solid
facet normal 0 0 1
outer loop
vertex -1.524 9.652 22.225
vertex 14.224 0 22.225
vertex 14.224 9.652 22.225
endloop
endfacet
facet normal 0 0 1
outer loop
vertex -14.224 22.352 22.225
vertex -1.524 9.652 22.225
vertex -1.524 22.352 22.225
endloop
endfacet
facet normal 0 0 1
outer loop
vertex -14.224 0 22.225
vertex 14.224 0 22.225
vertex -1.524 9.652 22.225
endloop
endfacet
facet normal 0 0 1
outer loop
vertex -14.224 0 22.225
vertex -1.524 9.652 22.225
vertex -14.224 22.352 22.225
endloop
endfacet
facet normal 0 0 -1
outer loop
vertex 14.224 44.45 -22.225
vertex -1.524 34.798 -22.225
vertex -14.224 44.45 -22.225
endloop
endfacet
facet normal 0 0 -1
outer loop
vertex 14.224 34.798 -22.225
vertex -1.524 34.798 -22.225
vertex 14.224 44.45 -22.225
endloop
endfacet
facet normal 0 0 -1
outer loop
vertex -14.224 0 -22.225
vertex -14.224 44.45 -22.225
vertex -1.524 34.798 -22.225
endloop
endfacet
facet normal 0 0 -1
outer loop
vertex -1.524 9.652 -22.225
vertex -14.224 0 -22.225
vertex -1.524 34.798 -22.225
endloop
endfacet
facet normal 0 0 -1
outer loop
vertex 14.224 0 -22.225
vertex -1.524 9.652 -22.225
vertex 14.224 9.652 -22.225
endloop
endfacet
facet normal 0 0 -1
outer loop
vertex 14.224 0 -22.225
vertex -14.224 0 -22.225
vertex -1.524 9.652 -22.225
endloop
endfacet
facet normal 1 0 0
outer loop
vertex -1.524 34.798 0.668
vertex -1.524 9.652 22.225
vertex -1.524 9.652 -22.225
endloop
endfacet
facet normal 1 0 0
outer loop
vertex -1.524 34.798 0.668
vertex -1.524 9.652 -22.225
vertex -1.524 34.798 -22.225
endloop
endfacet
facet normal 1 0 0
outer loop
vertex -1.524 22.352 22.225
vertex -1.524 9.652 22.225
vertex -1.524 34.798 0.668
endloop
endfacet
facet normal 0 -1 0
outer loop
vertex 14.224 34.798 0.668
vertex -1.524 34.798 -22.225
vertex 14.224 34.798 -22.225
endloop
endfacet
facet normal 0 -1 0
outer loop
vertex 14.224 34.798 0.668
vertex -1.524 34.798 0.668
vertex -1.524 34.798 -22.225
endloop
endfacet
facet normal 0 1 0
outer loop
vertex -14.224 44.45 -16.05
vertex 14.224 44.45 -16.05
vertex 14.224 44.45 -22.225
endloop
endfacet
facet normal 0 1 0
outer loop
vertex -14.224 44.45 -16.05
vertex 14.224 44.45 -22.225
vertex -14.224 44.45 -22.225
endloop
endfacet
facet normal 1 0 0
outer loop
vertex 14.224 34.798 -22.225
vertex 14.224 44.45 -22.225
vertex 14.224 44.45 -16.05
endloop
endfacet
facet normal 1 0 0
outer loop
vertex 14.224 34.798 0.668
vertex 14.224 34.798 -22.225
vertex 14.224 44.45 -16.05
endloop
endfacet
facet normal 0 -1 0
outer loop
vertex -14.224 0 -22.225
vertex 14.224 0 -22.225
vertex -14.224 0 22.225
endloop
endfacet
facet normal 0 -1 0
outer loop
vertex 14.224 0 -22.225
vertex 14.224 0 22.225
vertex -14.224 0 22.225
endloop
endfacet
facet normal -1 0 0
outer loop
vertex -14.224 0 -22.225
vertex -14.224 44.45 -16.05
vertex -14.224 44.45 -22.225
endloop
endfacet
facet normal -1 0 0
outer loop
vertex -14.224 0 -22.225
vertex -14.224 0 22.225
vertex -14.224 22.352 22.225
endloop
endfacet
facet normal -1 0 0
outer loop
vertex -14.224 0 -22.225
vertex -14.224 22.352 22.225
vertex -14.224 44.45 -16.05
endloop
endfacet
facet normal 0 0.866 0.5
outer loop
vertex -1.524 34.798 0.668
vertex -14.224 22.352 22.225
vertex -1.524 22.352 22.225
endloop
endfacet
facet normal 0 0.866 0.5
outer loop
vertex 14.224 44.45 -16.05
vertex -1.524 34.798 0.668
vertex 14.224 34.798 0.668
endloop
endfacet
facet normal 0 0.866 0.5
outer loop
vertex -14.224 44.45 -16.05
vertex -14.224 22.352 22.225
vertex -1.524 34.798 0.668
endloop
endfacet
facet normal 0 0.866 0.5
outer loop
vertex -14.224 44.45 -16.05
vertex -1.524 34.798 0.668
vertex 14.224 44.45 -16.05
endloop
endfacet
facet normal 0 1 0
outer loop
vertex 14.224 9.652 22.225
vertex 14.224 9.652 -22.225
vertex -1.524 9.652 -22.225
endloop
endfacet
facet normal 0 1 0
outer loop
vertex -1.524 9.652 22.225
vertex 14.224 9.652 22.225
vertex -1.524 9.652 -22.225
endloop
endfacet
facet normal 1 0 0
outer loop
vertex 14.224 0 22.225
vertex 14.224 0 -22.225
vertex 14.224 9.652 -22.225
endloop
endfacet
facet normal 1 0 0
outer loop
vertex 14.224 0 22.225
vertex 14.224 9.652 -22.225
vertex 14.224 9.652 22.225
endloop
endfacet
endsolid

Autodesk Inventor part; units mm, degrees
ref_plane "YZ Plane" through (0, 0, 0) normal (1, 0, 0) x (0, 1, 0)
ref_plane "XZ Plane" through (0, 0, 0) normal (0, 1, 0) x (-1, 0, 0)
ref_plane "XY Plane" through (0, 0, 0) normal (0, 0, 1) x (1, 0, 0)
sketch "Sketch1" plane through (0, 0, 0) normal (0, 1, 0) x (-1, 0, 0)
  line L0 (-14.224, 22.225) -> (14.224, 22.225)
  line L1 (14.224, 22.225) -> (14.224, -22.225)
  line L2 (14.224, -22.225) -> (-14.224, -22.225)
  line L3 (-14.224, -22.225) -> (-14.224, 22.225)
  line L4 (-14.224, 22.225) -> (14.224, -22.225) construction
  line L5 (14.224, 22.225) -> (-14.224, -22.225) construction
  point P0 (0, 0)
  dimension "d0" = 28.448
  dimension "d1" = 44.45
extrude "Extrusion1" add sketch "Sketch1" along normal blind 44.45
sketch "Sketch2" plane through (-14.224, 0, 22.225) normal (0, 0, 1) x (1, 0, 0)
  line L0 (12.7, 34.798) -> (53.9197, 34.798)
  line L1 (53.9197, 34.798) -> (53.9197, 9.652)
  line L2 (53.9197, 9.652) -> (12.7, 9.652)
  line L3 (12.7, 9.652) -> (12.7, 34.798)
  line L4 (0, 0) -> (0, 44.45) projected
  line L5 (0, 44.45) -> (28.448, 44.45) projected
  line L6 (0, 0) -> (28.448, 0) projected
  point P0 (14.224, 0)
  dimension "d4" = 12.7
  dimension "d5" = 9.652
  dimension "d6" = 9.652
extrude "Extrusion2" cut sketch "Sketch2" against normal blind 44.45
sketch "Sketch3" plane through (-14.224, 0, -22.225) normal (-1, 0, 0) x (0, 0, 1)
  line L0 (44.45, 22.352) -> (1.7207, 47.0218)
  line L1 (1.7207, 47.0218) -> (53.9201, 57.7184)
  line L2 (53.9201, 57.7184) -> (44.45, 22.352)
  line L3 (0, 0) -> (44.45, 0) projected
  line L4 (0, 44.45) -> (44.45, 44.45) projected
  point P0 (22.225, 0)
  dimension "d9" = 22.352
extrude "Extrusion3" cut sketch "Sketch3" against normal through all
properties part number "SLIDE"
